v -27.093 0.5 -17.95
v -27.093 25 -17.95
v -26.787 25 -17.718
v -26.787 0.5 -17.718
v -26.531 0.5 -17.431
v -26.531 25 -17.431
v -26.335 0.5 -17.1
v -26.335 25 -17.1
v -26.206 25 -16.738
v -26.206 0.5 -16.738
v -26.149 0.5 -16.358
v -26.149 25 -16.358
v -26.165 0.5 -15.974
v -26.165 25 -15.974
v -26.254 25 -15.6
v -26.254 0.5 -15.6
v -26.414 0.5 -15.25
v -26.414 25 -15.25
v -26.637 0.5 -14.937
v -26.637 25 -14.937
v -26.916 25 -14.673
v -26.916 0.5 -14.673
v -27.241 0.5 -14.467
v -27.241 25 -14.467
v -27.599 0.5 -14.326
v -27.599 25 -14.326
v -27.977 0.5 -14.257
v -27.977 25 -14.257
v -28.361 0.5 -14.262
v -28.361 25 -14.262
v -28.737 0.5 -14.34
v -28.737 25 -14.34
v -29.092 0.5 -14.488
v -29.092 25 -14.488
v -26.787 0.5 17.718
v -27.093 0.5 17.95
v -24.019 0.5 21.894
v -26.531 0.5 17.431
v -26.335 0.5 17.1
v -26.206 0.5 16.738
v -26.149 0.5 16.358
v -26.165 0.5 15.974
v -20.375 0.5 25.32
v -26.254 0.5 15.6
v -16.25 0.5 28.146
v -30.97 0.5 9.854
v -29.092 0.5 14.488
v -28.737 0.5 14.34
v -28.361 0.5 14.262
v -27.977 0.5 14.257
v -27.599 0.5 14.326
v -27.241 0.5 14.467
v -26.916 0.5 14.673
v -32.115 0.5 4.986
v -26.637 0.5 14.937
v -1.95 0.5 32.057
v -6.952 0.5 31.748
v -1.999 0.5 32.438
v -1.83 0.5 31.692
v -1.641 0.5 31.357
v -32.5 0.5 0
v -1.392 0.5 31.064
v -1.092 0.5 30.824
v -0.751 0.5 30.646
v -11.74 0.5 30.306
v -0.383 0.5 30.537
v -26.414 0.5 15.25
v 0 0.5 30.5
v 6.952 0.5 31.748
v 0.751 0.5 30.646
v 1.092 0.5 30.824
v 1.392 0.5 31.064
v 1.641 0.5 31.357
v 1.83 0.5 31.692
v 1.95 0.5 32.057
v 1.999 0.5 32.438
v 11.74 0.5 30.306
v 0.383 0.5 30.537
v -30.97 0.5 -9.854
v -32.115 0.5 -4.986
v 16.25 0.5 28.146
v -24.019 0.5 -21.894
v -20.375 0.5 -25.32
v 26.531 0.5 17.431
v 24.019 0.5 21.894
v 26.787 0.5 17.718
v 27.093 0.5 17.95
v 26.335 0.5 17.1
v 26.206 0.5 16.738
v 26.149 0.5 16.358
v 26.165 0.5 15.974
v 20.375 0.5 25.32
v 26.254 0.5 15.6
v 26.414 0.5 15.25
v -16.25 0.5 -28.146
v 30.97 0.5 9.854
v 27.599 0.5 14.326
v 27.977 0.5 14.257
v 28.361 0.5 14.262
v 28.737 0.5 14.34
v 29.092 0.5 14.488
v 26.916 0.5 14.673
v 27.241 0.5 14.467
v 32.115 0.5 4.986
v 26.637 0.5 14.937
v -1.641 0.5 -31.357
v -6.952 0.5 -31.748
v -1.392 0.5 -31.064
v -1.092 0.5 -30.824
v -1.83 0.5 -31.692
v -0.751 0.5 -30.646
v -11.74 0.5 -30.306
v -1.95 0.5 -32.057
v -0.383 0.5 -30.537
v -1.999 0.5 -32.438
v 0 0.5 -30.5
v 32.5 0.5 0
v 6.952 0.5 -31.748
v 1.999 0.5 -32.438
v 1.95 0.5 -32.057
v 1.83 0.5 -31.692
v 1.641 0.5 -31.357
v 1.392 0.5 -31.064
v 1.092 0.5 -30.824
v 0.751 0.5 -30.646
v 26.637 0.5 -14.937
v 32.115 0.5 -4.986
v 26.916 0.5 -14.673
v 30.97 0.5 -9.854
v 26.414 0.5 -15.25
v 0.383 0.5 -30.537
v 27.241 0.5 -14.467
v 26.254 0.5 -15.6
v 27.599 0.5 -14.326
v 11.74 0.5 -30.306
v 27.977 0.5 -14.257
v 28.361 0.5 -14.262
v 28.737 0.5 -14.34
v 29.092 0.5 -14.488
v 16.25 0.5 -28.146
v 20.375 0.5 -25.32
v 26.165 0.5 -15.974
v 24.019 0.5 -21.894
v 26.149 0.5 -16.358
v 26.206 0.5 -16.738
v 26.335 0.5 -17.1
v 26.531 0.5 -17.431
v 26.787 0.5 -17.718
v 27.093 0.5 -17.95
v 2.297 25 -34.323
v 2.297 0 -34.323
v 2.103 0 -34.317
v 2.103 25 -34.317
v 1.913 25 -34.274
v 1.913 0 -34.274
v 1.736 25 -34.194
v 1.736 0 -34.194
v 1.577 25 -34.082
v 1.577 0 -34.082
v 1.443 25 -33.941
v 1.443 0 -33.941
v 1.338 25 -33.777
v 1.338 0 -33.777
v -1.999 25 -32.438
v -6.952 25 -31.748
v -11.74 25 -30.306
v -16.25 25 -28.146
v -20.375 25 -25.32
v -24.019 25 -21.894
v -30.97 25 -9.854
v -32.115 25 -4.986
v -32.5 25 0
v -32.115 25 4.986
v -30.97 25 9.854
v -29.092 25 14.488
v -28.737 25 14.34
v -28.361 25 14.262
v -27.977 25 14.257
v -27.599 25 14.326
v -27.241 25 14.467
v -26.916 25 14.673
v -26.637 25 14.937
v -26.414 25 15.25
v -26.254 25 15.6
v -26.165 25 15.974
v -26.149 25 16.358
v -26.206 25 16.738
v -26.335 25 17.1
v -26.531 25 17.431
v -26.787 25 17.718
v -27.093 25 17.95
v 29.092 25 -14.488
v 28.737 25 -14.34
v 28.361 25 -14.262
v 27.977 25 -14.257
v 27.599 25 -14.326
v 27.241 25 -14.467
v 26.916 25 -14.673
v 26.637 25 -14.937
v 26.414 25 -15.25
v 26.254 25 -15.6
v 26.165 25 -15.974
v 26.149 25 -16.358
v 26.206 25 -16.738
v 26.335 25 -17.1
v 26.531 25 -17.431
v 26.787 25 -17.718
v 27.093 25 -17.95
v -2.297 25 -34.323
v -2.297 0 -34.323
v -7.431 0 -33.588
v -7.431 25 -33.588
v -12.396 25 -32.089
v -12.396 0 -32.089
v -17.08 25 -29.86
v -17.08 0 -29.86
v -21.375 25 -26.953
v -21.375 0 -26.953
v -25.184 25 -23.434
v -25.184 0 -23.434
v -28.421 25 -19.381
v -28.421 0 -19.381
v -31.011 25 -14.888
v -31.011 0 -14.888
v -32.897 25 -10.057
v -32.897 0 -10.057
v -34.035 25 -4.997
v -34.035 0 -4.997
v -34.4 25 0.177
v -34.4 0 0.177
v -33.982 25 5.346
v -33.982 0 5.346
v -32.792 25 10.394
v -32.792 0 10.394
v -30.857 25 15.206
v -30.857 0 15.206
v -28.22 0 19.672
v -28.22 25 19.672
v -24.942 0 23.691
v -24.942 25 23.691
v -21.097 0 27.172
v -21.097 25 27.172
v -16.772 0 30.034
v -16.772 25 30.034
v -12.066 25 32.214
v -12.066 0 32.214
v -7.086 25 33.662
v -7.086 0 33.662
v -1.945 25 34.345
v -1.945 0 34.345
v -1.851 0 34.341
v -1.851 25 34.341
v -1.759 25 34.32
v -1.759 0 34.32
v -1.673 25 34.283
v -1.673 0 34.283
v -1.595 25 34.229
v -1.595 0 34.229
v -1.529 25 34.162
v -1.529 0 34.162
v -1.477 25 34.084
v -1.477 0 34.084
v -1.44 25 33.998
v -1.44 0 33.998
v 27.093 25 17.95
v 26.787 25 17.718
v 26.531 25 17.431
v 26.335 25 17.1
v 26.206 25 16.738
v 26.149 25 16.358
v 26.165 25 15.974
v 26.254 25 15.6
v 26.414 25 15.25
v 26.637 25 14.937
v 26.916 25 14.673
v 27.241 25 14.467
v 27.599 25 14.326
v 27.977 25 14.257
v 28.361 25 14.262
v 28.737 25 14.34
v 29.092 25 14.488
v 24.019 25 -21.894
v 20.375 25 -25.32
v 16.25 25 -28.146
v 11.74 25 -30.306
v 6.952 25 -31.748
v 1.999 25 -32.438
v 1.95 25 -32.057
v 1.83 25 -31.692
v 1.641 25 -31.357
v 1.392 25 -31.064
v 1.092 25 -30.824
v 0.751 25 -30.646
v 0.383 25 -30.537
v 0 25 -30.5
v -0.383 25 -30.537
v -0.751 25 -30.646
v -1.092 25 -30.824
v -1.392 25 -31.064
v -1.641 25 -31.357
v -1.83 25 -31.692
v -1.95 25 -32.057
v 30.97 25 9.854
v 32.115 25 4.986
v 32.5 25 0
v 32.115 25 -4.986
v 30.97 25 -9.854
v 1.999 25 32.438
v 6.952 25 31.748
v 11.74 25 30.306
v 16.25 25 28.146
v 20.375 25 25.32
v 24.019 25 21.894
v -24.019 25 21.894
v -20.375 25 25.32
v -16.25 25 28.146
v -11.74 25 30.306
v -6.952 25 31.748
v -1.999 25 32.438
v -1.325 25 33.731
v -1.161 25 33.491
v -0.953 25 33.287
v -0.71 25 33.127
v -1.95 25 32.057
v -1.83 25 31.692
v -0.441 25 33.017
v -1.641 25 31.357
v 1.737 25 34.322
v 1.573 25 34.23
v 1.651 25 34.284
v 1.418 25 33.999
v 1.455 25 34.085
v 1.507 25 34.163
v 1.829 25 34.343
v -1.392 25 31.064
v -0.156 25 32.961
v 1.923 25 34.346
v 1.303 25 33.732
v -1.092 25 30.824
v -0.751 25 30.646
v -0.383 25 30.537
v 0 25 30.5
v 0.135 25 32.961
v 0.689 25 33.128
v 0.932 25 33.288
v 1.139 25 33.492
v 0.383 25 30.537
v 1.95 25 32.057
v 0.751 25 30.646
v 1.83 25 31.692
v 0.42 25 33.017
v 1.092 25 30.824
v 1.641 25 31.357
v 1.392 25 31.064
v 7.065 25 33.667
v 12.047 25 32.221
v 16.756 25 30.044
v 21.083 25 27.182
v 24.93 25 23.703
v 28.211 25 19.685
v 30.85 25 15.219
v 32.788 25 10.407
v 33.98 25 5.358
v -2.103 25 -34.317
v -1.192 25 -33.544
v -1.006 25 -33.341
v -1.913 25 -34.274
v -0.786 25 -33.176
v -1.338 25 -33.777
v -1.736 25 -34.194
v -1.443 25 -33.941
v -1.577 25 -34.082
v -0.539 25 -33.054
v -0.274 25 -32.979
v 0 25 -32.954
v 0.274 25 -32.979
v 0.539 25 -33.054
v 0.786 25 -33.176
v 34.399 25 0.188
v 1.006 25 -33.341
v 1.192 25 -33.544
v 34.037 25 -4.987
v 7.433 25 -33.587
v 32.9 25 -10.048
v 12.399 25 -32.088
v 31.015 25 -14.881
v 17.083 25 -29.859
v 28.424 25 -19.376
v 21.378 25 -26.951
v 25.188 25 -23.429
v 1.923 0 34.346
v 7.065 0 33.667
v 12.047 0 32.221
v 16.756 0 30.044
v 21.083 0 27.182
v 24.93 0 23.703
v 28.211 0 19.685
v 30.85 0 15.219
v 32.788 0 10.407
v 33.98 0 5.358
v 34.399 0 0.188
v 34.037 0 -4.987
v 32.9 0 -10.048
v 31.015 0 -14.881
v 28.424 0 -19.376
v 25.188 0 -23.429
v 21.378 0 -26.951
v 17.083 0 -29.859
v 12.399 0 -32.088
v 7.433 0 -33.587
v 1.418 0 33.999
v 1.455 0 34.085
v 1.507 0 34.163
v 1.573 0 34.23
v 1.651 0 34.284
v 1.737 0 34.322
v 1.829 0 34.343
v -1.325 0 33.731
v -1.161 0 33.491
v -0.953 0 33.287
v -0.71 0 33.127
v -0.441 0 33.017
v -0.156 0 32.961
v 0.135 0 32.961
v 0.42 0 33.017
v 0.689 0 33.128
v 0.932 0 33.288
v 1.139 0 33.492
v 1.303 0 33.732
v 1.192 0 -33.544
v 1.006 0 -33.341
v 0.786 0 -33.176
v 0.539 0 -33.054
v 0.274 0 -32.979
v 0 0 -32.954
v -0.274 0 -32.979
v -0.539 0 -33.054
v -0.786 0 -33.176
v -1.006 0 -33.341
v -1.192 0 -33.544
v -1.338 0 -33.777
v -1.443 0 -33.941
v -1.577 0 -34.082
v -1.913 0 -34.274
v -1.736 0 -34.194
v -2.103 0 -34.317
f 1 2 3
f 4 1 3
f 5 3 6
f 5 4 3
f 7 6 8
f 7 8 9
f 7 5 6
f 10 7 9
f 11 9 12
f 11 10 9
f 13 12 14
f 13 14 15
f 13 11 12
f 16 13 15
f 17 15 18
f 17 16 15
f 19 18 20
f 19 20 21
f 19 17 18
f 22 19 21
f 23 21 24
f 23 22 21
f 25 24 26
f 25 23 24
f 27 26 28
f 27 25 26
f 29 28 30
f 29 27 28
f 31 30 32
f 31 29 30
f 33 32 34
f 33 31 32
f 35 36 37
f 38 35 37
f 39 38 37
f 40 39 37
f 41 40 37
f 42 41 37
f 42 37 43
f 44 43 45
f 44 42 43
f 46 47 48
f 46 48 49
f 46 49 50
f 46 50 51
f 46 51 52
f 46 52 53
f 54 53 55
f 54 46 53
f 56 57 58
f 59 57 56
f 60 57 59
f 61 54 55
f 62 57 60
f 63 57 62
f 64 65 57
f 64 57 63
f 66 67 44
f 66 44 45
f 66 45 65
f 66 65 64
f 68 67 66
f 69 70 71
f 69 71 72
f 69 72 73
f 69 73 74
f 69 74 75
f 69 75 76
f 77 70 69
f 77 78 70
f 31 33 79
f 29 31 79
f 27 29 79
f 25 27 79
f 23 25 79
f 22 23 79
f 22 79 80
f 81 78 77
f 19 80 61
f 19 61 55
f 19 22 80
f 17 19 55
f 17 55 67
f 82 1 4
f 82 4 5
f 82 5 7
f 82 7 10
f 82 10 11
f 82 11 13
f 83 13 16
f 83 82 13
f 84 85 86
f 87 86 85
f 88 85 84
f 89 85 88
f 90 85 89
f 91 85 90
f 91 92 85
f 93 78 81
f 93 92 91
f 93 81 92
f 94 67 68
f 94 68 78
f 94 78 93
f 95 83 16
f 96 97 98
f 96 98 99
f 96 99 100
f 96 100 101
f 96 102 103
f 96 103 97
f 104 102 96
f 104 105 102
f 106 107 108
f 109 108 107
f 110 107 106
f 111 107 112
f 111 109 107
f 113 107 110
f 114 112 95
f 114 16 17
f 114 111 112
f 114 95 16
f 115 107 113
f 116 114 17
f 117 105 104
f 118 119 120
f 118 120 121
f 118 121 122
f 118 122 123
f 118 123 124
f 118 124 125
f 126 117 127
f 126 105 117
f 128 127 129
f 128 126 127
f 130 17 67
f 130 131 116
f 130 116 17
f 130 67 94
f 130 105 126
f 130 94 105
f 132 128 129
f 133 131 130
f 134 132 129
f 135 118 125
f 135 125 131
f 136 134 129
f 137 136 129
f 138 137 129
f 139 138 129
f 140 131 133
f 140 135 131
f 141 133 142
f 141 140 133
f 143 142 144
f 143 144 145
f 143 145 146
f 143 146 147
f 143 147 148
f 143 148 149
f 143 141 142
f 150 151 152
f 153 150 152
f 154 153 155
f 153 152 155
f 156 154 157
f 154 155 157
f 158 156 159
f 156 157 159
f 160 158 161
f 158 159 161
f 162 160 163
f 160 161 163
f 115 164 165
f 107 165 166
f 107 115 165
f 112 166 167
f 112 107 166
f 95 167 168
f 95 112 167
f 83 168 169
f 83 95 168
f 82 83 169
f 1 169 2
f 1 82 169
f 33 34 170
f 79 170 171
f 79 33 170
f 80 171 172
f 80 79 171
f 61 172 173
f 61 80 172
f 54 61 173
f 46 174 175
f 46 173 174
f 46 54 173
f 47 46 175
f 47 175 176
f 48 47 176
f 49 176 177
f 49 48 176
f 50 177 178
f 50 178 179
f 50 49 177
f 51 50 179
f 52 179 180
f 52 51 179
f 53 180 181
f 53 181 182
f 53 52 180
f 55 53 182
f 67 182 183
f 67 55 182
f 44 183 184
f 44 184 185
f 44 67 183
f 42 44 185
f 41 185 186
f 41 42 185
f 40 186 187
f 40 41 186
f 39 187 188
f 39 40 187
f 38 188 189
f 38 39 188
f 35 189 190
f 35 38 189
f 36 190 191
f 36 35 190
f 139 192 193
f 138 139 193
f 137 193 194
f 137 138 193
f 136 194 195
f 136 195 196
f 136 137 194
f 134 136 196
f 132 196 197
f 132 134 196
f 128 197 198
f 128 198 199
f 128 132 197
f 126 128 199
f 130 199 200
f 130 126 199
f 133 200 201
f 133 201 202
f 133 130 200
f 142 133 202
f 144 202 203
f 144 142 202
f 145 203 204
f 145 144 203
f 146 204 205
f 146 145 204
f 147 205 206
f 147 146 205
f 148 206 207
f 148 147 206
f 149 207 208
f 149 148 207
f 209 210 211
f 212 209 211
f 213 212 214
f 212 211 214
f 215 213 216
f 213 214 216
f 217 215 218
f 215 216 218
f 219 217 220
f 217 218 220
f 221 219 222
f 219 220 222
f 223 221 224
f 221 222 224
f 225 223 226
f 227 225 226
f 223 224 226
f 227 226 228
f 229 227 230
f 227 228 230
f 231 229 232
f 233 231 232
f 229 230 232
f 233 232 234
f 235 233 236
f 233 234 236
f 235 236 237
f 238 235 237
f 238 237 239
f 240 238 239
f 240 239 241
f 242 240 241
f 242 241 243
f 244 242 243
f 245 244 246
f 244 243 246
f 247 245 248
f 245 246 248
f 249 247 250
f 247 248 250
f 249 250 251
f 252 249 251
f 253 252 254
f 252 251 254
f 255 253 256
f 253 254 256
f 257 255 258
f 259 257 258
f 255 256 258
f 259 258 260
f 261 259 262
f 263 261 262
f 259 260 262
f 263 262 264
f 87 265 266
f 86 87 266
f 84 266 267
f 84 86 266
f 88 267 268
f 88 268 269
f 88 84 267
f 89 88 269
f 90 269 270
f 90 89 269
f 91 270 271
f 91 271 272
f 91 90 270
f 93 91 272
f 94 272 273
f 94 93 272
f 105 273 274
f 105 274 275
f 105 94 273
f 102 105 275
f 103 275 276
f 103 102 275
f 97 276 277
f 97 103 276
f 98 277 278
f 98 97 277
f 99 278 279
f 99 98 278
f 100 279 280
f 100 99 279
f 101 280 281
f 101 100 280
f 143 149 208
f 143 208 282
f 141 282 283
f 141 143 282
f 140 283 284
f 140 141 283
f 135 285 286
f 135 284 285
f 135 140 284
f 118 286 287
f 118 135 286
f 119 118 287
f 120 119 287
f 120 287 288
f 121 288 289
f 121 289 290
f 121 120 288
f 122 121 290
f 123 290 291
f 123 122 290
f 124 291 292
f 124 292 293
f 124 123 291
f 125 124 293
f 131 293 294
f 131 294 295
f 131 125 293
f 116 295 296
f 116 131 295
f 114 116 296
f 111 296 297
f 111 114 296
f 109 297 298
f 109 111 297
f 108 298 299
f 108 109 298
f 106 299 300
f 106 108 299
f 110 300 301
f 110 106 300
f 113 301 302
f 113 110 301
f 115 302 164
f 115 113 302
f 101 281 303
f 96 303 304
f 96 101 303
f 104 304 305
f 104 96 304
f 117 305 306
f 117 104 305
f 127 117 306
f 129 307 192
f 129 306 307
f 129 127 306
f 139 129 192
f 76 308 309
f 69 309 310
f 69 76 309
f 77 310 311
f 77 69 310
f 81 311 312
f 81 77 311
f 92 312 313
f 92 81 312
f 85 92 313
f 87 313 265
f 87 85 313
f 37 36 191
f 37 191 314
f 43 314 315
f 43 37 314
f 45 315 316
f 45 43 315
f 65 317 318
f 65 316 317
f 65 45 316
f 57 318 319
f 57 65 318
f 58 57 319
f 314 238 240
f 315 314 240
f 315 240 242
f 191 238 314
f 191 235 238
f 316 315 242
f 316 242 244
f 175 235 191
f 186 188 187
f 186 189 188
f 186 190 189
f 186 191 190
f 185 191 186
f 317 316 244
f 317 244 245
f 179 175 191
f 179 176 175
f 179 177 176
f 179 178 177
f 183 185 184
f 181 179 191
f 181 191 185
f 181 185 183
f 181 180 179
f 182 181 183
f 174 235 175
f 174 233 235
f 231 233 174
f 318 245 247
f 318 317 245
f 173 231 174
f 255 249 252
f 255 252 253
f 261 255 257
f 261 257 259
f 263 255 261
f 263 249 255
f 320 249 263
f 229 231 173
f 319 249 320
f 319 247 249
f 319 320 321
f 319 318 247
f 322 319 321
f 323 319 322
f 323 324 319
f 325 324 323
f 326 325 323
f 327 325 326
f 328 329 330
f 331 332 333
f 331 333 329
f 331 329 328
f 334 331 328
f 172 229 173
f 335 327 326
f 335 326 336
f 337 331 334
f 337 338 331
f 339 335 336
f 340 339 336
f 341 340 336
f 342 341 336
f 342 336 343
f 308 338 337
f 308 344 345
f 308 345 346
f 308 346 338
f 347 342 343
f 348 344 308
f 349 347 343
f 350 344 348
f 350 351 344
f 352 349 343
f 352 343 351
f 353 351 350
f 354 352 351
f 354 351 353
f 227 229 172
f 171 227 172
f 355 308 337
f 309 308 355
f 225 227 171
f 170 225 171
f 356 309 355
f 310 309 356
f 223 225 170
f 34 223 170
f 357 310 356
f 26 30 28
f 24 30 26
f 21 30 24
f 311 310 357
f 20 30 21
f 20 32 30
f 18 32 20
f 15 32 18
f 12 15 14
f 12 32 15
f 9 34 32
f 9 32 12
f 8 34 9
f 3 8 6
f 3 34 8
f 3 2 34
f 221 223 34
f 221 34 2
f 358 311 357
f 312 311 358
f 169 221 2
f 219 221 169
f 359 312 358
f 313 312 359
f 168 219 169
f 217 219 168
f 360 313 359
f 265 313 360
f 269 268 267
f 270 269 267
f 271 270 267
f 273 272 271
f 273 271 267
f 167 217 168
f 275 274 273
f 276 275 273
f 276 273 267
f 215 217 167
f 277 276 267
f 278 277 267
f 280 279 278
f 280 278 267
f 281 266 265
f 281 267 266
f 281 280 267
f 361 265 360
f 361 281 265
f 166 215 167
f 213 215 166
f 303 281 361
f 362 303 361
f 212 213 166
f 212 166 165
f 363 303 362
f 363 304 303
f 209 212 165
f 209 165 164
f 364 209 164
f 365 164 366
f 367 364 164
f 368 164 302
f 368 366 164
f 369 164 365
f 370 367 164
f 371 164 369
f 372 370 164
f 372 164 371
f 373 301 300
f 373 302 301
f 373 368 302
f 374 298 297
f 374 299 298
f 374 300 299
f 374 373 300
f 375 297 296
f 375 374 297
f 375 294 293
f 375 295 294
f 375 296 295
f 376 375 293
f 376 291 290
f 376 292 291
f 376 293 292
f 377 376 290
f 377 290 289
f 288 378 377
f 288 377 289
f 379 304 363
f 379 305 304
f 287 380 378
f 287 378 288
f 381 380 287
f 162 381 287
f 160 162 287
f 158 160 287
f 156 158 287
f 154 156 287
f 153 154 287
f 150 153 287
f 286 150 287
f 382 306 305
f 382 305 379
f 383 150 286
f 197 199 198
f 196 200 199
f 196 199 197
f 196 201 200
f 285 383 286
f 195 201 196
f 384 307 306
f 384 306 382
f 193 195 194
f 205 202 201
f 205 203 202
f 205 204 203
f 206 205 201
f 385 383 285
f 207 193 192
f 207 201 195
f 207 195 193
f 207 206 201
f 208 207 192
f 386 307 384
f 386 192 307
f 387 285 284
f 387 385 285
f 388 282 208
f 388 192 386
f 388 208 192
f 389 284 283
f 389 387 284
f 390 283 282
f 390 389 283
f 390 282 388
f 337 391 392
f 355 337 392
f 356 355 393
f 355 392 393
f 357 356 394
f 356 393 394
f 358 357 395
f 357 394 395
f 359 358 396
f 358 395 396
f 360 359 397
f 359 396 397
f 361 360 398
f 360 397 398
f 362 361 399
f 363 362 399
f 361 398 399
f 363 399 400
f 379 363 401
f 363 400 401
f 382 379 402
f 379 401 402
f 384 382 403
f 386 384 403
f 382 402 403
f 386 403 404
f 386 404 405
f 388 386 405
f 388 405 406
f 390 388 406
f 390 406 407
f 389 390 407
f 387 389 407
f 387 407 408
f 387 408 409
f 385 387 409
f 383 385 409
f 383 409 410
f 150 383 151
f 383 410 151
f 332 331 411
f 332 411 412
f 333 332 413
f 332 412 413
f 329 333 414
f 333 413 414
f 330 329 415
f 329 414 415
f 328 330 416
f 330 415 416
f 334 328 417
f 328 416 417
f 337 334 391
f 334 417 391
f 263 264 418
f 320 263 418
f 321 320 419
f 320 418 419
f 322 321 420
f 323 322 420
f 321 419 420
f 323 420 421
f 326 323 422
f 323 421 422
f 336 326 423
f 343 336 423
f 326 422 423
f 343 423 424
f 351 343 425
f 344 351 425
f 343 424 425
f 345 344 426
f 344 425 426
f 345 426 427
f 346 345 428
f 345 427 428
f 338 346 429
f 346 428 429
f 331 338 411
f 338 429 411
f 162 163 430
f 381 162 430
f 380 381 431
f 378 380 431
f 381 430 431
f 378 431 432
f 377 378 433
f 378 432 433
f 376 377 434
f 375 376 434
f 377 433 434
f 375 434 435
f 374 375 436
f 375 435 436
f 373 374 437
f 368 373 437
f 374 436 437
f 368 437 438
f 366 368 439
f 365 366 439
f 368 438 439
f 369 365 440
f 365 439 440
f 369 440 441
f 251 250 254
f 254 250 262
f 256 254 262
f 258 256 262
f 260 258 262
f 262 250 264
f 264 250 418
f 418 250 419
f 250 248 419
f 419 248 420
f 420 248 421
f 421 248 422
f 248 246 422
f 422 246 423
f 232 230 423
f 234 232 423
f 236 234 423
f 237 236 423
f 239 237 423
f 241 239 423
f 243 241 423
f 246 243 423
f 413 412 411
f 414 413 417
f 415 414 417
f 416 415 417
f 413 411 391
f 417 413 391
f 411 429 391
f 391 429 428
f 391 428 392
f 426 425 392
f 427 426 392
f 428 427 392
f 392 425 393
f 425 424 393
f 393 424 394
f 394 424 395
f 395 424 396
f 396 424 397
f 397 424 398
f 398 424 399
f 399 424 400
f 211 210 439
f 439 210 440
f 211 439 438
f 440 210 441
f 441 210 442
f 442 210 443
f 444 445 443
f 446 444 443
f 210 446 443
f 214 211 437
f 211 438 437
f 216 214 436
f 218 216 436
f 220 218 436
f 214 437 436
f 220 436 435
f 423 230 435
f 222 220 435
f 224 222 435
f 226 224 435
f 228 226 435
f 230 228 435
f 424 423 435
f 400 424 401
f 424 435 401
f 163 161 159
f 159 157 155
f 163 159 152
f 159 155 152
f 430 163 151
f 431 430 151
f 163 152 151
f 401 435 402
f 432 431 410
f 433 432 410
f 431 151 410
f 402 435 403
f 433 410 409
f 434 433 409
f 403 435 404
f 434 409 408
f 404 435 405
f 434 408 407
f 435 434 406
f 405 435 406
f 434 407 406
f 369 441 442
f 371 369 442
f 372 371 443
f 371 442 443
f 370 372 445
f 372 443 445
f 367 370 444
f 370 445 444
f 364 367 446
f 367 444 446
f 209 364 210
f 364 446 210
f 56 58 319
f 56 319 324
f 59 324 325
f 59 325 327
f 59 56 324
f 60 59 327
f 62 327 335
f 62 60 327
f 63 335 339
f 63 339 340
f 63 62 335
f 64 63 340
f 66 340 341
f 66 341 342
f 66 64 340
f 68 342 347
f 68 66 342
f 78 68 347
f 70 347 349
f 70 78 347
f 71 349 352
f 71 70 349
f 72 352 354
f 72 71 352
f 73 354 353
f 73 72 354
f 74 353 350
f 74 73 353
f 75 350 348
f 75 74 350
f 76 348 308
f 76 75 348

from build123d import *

# Parameters (mm, degrees)
BOSS_EXTRUDE1_DEPTH = 25
CUT_EXTRUDE2_DEPTH  = 26
BOSS_EXTRUDE2_DEPTH = 0.5


with BuildPart() as part:
    # Sketch1 → Boss-Extrude1 (new body)
    with BuildSketch(Plane(origin=(0, 0, 0), x_dir=(1, 0, 0), z_dir=(0, 1, 0))):
        with BuildLine():
            ThreePointArc((1.418185365, -33.998799682), (1.610940688, -34.258772233), (1.922534331, -34.346235045))
            ThreePointArc((1.922534331, -34.346235045), (34.399487229, -0.187825316), (2.297477624, 34.323193275))
            ThreePointArc((2.297477624, 34.323193275), (1.735753357, 34.194354817), (1.33841429, 33.776916))
            ThreePointArc((1.33841429, 33.776916), (0, 32.954150957), (-1.33841429, 33.776916))
            ThreePointArc((-1.33841429, 33.776916), (-1.735753357, 34.194354817), (-2.297477624, 34.323193275))
            ThreePointArc((-2.297477624, 34.323193275), (-34.399545597, -0.176812713), (-1.944525024, -34.344997051))
            ThreePointArc((-1.944525024, -34.344997051), (-1.632875445, -34.257733763), (-1.439953708, -33.997884682))
            ThreePointArc((-1.439953708, -33.997884682), (-0.010549885, -32.954149268), (1.418185365, -33.998799682))
        make_face()
        with BuildLine():
            Line((-2.417, 3.18717916), (0, 3.18717916))
            Line((0, 3.18717916), (2.417, 3.18717916))
            ThreePointArc((2.417, 3.18717916), (0, -4), (-2.417, 3.18717916))
        make_face(mode=Mode.SUBTRACT)
    extrude(amount=BOSS_EXTRUDE1_DEPTH)

    # Sketch2 → Cut-Extrude2 (cut, through all)
    with BuildSketch(Plane(origin=(0, 0, 0), x_dir=(1, 0, 0), z_dir=(0, 1, 0))):
        with BuildLine():
            ThreePointArc((1.99905303, 32.438461538), (0, 30.5), (-1.99905303, 32.438461538))
            ThreePointArc((-1.99905303, 32.438461538), (-16.25, 28.145825623), (-27.093005237, 17.950461477))
            ThreePointArc((-27.093005237, 17.950461477), (-26.413774815, 15.25), (-29.092058267, 14.488000062))
            ThreePointArc((-29.092058267, 14.488000062), (-32.5, 0), (-29.092058267, -14.488000062))
            ThreePointArc((-29.092058267, -14.488000062), (-26.413774815, -15.25), (-27.093005237, -17.950461477))
            ThreePointArc((-27.093005237, -17.950461477), (-16.25, -28.145825623), (-1.99905303, -32.438461538))
            ThreePointArc((-1.99905303, -32.438461538), (0, -30.5), (1.99905303, -32.438461538))
            ThreePointArc((1.99905303, -32.438461538), (16.25, -28.145825623), (27.093005237, -17.950461477))
            ThreePointArc((27.093005237, -17.950461477), (26.413774815, -15.25), (29.092058267, -14.488000062))
            ThreePointArc((29.092058267, -14.488000062), (32.5, 0), (29.092058267, 14.488000062))
            ThreePointArc((29.092058267, 14.488000062), (26.413774815, 15.25), (27.093005237, 17.950461477))
            ThreePointArc((27.093005237, 17.950461477), (16.25, 28.145825623), (1.99905303, 32.438461538))
        make_face()
    extrude(amount=CUT_EXTRUDE2_DEPTH, mode=Mode.SUBTRACT)

    # Sketch2<2> → Boss-Extrude2 (add)
    with BuildSketch(Plane(origin=(0, 0, 0), x_dir=(1, 0, 0), z_dir=(0, 1, 0))):
        with BuildLine():
            ThreePointArc((1.99905303, 32.438461538), (0, 30.5), (-1.99905303, 32.438461538))
            ThreePointArc((-1.99905303, 32.438461538), (-16.25, 28.145825623), (-27.093005237, 17.950461477))
            ThreePointArc((-27.093005237, 17.950461477), (-26.413774815, 15.25), (-29.092058267, 14.488000062))
            ThreePointArc((-29.092058267, 14.488000062), (-32.5, 0), (-29.092058267, -14.488000062))
            ThreePointArc((-29.092058267, -14.488000062), (-26.413774815, -15.25), (-27.093005237, -17.950461477))
            ThreePointArc((-27.093005237, -17.950461477), (-16.25, -28.145825623), (-1.99905303, -32.438461538))
            ThreePointArc((-1.99905303, -32.438461538), (0, -30.5), (1.99905303, -32.438461538))
            ThreePointArc((1.99905303, -32.438461538), (16.25, -28.145825623), (27.093005237, -17.950461477))
            ThreePointArc((27.093005237, -17.950461477), (26.413774815, -15.25), (29.092058267, -14.488000062))
            ThreePointArc((29.092058267, -14.488000062), (32.5, 0), (29.092058267, 14.488000062))
            ThreePointArc((29.092058267, 14.488000062), (26.413774815, 15.25), (27.093005237, 17.950461477))
            ThreePointArc((27.093005237, 17.950461477), (16.25, 28.145825623), (1.99905303, 32.438461538))
        make_face()
    extrude(amount=BOSS_EXTRUDE2_DEPTH)


solid = part.part
